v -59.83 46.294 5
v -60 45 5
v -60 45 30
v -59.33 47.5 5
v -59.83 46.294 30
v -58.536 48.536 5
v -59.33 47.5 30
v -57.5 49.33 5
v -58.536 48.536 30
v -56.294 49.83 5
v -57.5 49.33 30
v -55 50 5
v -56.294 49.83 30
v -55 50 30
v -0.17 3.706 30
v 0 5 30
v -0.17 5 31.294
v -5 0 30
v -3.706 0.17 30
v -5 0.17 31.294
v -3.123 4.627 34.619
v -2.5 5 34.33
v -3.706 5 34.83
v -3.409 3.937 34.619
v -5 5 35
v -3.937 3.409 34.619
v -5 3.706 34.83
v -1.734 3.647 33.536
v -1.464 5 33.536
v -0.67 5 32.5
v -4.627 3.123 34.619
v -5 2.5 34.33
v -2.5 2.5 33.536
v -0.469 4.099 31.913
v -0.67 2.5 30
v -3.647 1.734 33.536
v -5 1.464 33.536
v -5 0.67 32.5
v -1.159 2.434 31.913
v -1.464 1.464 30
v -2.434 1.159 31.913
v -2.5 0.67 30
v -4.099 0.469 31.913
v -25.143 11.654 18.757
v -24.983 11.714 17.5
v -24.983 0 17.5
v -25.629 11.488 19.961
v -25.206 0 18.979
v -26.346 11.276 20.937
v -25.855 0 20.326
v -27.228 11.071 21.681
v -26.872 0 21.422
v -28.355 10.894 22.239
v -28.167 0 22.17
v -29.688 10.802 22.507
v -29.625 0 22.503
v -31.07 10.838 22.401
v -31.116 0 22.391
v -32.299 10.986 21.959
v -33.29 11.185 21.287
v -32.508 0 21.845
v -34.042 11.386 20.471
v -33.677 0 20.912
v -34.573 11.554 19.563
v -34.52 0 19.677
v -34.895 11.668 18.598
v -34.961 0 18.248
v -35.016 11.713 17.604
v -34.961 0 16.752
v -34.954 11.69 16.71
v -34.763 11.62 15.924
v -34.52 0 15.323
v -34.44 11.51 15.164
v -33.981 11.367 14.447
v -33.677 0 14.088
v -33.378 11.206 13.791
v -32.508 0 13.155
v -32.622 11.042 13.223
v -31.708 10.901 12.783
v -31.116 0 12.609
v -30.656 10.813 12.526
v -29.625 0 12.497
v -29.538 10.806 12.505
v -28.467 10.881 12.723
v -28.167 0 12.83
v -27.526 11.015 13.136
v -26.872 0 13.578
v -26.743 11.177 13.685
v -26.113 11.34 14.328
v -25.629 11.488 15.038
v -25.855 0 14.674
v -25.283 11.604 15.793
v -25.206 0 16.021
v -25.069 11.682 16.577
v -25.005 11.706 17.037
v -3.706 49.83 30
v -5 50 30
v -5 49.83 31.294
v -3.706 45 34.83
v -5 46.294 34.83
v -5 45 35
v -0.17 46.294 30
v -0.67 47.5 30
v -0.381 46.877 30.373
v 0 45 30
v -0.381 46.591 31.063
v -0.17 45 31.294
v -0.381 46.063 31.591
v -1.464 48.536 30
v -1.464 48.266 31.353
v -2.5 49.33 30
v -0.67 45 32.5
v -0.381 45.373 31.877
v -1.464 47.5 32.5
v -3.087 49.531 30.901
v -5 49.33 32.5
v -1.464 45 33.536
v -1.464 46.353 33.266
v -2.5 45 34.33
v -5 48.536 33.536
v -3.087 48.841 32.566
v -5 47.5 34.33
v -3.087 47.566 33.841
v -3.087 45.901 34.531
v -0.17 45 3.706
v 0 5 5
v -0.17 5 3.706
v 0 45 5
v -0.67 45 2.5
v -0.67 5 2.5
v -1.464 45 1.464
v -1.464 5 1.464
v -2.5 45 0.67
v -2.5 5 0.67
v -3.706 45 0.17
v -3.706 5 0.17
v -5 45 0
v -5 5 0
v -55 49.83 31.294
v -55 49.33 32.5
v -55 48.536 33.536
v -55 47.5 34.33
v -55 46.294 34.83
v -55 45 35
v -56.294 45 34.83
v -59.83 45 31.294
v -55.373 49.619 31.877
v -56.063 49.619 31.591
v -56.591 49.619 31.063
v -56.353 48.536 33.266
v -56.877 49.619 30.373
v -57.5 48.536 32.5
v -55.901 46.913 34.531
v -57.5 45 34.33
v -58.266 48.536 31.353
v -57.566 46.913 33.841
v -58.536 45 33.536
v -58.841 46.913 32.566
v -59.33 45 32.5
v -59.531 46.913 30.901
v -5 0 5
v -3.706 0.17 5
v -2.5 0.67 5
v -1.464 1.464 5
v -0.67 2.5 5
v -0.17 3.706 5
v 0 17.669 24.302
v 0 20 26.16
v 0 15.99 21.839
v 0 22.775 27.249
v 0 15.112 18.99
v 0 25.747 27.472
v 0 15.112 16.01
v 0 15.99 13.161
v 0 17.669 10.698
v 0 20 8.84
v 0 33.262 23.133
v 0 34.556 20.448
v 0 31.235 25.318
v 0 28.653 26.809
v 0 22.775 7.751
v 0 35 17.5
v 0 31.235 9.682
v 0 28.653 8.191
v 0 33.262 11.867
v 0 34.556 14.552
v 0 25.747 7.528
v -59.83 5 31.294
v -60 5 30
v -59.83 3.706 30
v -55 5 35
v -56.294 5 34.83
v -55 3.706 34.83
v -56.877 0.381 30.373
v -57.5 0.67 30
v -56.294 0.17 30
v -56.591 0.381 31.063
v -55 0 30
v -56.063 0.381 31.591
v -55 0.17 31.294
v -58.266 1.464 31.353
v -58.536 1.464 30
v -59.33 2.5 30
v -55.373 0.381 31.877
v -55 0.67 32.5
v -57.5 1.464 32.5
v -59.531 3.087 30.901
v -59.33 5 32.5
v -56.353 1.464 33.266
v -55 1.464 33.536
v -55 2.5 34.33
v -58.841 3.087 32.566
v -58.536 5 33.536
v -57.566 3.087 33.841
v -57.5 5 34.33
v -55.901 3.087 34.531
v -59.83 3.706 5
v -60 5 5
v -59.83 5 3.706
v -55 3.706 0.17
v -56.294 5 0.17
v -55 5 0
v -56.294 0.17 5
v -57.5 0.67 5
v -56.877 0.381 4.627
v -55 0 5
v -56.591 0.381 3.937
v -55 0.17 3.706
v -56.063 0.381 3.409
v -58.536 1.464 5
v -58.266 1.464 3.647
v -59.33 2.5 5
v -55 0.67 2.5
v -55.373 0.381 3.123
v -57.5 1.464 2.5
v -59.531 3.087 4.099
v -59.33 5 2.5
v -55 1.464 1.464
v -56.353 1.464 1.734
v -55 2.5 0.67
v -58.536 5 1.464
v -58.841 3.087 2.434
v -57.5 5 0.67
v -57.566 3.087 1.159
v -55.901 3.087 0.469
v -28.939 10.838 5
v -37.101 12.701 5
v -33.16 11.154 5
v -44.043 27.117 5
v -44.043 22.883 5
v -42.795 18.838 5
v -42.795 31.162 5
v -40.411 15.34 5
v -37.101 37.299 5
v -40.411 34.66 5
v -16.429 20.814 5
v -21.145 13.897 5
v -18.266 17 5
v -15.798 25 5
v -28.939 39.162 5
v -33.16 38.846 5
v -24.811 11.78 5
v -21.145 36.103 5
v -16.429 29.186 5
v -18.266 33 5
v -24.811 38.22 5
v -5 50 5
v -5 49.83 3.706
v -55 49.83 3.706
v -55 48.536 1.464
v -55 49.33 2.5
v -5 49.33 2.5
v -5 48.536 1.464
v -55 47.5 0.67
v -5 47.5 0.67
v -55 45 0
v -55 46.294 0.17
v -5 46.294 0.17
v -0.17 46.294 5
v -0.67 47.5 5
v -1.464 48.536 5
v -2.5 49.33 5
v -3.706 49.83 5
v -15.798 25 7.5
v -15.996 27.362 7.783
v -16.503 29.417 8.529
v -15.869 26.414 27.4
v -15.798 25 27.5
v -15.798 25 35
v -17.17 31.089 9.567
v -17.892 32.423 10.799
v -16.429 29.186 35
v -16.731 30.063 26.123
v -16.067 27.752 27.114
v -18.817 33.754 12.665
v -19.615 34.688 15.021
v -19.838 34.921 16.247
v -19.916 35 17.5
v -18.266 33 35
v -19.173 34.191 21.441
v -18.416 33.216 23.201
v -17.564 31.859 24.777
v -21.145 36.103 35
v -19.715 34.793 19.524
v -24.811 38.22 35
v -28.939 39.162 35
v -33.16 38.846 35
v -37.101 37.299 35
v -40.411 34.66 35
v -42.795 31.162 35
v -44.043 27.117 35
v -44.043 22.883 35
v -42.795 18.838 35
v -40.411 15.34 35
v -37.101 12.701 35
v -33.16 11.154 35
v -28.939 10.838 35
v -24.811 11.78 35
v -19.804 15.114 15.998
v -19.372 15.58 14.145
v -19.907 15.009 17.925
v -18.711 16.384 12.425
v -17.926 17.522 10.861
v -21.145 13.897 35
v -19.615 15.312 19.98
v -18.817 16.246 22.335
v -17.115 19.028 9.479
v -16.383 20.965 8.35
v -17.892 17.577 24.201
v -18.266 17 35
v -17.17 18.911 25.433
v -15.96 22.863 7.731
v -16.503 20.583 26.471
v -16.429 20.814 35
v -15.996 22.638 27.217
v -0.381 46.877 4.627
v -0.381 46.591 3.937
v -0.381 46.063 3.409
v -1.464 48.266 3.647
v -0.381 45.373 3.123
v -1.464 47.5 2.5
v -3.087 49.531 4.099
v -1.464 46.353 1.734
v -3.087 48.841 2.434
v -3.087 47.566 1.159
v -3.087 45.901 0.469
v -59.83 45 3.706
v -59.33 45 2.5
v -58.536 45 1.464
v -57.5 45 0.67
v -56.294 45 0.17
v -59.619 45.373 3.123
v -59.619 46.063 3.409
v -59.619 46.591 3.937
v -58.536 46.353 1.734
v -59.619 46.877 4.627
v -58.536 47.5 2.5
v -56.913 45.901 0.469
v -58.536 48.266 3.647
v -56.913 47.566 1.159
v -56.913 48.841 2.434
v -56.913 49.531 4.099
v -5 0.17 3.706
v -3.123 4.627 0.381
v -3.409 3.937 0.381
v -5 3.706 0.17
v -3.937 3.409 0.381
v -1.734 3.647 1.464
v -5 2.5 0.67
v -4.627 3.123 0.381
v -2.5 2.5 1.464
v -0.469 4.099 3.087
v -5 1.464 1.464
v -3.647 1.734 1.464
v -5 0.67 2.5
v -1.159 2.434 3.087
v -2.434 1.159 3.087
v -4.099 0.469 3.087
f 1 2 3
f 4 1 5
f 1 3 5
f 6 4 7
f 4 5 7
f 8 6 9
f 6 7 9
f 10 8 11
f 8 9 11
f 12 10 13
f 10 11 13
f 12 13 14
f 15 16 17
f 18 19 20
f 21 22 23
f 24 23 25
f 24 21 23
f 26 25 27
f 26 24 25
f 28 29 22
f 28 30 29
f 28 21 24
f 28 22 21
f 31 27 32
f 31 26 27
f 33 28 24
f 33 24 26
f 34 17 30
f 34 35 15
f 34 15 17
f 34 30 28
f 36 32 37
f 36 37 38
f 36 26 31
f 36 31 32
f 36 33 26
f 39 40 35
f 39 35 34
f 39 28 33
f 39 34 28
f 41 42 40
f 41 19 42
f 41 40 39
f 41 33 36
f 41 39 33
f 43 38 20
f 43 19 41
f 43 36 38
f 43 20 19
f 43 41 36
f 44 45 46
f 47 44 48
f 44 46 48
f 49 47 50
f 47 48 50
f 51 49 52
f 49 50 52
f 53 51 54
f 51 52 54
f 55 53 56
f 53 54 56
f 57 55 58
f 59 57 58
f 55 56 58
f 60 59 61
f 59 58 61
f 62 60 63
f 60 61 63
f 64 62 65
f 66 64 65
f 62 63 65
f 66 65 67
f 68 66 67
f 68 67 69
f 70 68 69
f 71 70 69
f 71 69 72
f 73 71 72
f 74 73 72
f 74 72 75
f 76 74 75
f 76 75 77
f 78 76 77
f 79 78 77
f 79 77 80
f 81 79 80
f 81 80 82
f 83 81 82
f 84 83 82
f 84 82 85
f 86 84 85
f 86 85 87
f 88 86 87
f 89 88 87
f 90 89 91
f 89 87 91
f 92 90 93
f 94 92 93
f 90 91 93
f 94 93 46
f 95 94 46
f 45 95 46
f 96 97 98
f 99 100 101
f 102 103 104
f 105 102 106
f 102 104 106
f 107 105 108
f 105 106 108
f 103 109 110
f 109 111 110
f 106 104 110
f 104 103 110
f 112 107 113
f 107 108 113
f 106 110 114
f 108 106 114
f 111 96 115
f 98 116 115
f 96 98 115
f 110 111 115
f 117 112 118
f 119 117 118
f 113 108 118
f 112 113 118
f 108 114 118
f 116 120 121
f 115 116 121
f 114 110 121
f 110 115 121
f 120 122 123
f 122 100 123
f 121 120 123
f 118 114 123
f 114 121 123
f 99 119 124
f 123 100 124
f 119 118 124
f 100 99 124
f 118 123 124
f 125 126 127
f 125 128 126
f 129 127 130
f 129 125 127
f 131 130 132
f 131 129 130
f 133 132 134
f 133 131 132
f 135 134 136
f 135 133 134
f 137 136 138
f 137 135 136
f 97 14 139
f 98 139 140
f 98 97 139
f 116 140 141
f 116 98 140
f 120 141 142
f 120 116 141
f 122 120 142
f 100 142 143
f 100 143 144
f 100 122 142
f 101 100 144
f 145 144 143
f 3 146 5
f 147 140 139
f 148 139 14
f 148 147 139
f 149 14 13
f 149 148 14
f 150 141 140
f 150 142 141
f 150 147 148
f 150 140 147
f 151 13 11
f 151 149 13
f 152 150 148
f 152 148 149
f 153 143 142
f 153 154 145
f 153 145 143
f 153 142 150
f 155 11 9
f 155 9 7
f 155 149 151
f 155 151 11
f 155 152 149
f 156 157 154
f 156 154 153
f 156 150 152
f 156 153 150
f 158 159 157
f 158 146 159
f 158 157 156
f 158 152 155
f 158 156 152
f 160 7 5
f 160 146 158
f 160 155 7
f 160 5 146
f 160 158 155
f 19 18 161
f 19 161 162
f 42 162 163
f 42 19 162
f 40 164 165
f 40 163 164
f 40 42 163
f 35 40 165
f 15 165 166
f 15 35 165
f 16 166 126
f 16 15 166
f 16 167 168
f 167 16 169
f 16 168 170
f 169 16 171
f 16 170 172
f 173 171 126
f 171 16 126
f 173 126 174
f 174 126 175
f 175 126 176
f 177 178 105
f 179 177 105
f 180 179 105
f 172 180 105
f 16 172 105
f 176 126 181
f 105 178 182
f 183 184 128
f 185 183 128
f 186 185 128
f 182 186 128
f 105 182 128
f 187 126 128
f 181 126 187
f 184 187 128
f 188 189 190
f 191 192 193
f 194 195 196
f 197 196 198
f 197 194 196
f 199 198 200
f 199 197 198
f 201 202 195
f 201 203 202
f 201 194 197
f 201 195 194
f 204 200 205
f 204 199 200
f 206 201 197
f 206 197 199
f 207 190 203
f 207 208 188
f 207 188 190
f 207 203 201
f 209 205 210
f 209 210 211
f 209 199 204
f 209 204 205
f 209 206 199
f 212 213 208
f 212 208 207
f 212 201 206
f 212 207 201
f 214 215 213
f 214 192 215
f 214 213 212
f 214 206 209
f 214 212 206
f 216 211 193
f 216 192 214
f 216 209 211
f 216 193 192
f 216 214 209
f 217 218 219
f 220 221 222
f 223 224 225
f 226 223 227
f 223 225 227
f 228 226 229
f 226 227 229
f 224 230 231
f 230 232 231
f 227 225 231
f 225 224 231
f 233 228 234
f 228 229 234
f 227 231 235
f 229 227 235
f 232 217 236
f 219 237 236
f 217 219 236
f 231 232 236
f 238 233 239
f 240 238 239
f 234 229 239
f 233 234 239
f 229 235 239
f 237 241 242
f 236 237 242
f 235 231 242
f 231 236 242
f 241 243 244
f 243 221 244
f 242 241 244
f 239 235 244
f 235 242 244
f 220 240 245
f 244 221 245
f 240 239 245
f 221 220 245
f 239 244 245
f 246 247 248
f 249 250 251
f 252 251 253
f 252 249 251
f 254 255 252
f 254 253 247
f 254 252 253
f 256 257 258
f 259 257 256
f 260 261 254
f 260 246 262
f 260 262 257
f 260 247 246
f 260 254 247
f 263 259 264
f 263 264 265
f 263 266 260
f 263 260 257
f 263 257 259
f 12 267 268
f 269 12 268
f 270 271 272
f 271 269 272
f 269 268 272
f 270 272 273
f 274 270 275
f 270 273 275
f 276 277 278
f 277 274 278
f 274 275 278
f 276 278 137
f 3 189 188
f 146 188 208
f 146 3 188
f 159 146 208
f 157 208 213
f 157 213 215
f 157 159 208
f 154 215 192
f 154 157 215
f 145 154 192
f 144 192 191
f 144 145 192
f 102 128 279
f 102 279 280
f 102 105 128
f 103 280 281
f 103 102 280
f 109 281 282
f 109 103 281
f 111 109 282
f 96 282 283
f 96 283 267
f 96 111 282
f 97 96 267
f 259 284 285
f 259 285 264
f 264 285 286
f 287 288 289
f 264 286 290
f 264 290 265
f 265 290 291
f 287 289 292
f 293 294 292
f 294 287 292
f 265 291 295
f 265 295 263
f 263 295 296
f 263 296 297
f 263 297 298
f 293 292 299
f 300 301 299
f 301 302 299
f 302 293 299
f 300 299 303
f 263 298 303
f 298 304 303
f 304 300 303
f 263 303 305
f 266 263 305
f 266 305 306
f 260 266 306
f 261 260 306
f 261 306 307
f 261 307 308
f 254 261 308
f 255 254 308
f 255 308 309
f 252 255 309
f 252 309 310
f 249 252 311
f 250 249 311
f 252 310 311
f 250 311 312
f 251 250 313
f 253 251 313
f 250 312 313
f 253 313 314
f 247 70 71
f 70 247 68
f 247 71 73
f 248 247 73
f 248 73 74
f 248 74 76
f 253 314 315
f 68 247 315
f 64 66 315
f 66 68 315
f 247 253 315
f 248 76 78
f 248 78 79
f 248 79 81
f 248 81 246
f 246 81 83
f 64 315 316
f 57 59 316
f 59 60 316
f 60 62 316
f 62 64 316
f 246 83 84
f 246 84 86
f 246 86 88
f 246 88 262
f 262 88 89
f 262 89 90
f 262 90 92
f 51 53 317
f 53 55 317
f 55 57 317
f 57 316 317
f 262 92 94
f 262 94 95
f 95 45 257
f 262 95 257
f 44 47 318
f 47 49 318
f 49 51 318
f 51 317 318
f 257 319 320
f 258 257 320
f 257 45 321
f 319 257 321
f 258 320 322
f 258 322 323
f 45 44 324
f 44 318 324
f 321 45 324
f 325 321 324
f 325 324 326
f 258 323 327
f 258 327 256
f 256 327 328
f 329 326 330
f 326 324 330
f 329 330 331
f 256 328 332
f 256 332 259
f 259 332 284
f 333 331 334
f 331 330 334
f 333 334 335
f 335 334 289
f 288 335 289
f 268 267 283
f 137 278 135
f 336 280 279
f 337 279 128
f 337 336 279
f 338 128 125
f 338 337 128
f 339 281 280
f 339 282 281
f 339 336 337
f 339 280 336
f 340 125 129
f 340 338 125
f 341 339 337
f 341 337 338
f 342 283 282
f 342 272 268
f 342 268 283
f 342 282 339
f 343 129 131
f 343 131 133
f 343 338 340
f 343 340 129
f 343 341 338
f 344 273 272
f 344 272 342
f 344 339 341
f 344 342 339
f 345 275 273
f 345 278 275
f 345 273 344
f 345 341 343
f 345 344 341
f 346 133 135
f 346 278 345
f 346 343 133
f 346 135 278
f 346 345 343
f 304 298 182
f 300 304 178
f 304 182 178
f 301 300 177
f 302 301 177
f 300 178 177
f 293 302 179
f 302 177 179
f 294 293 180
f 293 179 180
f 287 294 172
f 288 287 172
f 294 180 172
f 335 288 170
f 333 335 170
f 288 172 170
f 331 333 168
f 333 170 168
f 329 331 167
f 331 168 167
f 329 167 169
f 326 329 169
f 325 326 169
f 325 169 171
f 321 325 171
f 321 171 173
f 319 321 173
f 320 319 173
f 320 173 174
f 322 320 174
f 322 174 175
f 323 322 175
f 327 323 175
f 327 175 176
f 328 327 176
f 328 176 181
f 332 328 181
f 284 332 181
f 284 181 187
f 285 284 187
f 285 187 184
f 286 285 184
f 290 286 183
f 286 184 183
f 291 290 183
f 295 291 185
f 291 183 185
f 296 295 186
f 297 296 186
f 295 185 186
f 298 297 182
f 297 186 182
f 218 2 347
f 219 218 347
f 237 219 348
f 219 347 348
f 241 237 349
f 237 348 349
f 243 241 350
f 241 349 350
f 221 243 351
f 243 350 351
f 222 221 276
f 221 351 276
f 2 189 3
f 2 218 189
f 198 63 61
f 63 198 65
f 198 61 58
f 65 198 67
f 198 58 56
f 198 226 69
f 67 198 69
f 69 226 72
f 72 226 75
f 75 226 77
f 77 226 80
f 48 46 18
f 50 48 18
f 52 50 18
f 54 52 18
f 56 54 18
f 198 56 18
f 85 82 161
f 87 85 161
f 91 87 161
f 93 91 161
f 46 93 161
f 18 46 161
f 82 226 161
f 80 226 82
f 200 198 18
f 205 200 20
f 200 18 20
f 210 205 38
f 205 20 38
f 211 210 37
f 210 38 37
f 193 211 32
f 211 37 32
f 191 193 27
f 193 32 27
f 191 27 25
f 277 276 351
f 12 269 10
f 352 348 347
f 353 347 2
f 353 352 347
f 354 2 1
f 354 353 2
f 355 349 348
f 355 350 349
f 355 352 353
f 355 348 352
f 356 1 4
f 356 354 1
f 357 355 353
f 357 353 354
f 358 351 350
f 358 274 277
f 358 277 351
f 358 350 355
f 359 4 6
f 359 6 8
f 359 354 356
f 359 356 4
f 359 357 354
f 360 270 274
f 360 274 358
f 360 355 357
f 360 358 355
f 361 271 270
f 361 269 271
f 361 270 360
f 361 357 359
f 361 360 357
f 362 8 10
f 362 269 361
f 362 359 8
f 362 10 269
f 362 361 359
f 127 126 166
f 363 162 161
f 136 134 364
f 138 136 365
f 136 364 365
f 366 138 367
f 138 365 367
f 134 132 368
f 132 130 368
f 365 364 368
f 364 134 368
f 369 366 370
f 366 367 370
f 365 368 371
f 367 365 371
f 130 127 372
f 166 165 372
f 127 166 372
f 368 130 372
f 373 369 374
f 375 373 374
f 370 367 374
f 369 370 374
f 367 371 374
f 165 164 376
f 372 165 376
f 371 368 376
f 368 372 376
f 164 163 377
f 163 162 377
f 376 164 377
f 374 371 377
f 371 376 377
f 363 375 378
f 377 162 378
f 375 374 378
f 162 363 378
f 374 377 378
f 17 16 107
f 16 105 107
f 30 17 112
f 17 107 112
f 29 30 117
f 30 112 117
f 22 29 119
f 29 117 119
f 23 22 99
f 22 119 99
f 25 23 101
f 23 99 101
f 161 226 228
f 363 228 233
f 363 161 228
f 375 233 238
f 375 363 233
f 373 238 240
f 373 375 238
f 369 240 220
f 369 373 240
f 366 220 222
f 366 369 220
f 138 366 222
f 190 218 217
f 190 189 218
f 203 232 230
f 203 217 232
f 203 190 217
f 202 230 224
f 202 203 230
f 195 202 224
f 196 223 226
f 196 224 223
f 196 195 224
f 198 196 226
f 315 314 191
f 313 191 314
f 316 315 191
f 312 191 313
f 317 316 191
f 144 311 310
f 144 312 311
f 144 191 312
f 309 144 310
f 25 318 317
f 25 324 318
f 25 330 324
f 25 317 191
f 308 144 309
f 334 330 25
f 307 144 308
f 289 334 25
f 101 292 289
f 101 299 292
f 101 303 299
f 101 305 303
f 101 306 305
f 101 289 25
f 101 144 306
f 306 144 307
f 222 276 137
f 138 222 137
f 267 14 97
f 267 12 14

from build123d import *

# Parameters (mm, degrees)
F0_W     = 60
F0_H     = 50
F1_DEPTH = 35
F2_R     = 5
F3_R     = 10
F4_DEPTH = 30
F5_R     = 14.2018831862
F6_DEPTH = 30
F7_R     = 5.0166024016
F8_DEPTH = 13.3


# Not quite as in the source:
# - the program builds the solid bodies; features that only make, move or delete a surface that nothing else refers to are left out


with BuildPart() as f1:
    # F0 (on Top) → F1 (new body)
    with BuildSketch(Plane.XY):
        with Locations((-30, 25)):
            Rectangle(F0_W, F0_H)
    extrude(amount=F1_DEPTH)

    # F2
    f2_edges = [f1.edges().sort_by_distance(p)[0] for p in [
        (-60, 25, 35),
        (-30, 50, 35),
        (-30, 50, 0),
        (-60, 25, 0),
        (-60, 0, 17.5),
        (0, 50, 17.5),
        (-60, 50, 17.5),
        (0, 0, 17.5),
        (0, 25, 0),
        (0, 25, 35),
        (-30, 0, 35),
        (-30, 0, 0),
    ]]
    fillet(f2_edges, radius=F2_R)

    # F3 (on face) → F4 (cut)
    with BuildSketch(Plane.YZ):
        with Locations((25, 17.5)):
            Circle(F3_R)
    extrude(amount=-F4_DEPTH, mode=Mode.SUBTRACT)

    # F5 (on face) → F6 (cut)
    with BuildSketch(Plane.XY.offset(35)):
        with Locations((-30, 25)):
            Circle(F5_R)
    extrude(amount=-F6_DEPTH, mode=Mode.SUBTRACT)

    # F7 (on face) → F8 (cut)
    with BuildSketch(Plane.XZ):
        with Locations((-30, 17.5)):
            Circle(F7_R)
    extrude(amount=-F8_DEPTH, mode=Mode.SUBTRACT)


solid = f1.part
